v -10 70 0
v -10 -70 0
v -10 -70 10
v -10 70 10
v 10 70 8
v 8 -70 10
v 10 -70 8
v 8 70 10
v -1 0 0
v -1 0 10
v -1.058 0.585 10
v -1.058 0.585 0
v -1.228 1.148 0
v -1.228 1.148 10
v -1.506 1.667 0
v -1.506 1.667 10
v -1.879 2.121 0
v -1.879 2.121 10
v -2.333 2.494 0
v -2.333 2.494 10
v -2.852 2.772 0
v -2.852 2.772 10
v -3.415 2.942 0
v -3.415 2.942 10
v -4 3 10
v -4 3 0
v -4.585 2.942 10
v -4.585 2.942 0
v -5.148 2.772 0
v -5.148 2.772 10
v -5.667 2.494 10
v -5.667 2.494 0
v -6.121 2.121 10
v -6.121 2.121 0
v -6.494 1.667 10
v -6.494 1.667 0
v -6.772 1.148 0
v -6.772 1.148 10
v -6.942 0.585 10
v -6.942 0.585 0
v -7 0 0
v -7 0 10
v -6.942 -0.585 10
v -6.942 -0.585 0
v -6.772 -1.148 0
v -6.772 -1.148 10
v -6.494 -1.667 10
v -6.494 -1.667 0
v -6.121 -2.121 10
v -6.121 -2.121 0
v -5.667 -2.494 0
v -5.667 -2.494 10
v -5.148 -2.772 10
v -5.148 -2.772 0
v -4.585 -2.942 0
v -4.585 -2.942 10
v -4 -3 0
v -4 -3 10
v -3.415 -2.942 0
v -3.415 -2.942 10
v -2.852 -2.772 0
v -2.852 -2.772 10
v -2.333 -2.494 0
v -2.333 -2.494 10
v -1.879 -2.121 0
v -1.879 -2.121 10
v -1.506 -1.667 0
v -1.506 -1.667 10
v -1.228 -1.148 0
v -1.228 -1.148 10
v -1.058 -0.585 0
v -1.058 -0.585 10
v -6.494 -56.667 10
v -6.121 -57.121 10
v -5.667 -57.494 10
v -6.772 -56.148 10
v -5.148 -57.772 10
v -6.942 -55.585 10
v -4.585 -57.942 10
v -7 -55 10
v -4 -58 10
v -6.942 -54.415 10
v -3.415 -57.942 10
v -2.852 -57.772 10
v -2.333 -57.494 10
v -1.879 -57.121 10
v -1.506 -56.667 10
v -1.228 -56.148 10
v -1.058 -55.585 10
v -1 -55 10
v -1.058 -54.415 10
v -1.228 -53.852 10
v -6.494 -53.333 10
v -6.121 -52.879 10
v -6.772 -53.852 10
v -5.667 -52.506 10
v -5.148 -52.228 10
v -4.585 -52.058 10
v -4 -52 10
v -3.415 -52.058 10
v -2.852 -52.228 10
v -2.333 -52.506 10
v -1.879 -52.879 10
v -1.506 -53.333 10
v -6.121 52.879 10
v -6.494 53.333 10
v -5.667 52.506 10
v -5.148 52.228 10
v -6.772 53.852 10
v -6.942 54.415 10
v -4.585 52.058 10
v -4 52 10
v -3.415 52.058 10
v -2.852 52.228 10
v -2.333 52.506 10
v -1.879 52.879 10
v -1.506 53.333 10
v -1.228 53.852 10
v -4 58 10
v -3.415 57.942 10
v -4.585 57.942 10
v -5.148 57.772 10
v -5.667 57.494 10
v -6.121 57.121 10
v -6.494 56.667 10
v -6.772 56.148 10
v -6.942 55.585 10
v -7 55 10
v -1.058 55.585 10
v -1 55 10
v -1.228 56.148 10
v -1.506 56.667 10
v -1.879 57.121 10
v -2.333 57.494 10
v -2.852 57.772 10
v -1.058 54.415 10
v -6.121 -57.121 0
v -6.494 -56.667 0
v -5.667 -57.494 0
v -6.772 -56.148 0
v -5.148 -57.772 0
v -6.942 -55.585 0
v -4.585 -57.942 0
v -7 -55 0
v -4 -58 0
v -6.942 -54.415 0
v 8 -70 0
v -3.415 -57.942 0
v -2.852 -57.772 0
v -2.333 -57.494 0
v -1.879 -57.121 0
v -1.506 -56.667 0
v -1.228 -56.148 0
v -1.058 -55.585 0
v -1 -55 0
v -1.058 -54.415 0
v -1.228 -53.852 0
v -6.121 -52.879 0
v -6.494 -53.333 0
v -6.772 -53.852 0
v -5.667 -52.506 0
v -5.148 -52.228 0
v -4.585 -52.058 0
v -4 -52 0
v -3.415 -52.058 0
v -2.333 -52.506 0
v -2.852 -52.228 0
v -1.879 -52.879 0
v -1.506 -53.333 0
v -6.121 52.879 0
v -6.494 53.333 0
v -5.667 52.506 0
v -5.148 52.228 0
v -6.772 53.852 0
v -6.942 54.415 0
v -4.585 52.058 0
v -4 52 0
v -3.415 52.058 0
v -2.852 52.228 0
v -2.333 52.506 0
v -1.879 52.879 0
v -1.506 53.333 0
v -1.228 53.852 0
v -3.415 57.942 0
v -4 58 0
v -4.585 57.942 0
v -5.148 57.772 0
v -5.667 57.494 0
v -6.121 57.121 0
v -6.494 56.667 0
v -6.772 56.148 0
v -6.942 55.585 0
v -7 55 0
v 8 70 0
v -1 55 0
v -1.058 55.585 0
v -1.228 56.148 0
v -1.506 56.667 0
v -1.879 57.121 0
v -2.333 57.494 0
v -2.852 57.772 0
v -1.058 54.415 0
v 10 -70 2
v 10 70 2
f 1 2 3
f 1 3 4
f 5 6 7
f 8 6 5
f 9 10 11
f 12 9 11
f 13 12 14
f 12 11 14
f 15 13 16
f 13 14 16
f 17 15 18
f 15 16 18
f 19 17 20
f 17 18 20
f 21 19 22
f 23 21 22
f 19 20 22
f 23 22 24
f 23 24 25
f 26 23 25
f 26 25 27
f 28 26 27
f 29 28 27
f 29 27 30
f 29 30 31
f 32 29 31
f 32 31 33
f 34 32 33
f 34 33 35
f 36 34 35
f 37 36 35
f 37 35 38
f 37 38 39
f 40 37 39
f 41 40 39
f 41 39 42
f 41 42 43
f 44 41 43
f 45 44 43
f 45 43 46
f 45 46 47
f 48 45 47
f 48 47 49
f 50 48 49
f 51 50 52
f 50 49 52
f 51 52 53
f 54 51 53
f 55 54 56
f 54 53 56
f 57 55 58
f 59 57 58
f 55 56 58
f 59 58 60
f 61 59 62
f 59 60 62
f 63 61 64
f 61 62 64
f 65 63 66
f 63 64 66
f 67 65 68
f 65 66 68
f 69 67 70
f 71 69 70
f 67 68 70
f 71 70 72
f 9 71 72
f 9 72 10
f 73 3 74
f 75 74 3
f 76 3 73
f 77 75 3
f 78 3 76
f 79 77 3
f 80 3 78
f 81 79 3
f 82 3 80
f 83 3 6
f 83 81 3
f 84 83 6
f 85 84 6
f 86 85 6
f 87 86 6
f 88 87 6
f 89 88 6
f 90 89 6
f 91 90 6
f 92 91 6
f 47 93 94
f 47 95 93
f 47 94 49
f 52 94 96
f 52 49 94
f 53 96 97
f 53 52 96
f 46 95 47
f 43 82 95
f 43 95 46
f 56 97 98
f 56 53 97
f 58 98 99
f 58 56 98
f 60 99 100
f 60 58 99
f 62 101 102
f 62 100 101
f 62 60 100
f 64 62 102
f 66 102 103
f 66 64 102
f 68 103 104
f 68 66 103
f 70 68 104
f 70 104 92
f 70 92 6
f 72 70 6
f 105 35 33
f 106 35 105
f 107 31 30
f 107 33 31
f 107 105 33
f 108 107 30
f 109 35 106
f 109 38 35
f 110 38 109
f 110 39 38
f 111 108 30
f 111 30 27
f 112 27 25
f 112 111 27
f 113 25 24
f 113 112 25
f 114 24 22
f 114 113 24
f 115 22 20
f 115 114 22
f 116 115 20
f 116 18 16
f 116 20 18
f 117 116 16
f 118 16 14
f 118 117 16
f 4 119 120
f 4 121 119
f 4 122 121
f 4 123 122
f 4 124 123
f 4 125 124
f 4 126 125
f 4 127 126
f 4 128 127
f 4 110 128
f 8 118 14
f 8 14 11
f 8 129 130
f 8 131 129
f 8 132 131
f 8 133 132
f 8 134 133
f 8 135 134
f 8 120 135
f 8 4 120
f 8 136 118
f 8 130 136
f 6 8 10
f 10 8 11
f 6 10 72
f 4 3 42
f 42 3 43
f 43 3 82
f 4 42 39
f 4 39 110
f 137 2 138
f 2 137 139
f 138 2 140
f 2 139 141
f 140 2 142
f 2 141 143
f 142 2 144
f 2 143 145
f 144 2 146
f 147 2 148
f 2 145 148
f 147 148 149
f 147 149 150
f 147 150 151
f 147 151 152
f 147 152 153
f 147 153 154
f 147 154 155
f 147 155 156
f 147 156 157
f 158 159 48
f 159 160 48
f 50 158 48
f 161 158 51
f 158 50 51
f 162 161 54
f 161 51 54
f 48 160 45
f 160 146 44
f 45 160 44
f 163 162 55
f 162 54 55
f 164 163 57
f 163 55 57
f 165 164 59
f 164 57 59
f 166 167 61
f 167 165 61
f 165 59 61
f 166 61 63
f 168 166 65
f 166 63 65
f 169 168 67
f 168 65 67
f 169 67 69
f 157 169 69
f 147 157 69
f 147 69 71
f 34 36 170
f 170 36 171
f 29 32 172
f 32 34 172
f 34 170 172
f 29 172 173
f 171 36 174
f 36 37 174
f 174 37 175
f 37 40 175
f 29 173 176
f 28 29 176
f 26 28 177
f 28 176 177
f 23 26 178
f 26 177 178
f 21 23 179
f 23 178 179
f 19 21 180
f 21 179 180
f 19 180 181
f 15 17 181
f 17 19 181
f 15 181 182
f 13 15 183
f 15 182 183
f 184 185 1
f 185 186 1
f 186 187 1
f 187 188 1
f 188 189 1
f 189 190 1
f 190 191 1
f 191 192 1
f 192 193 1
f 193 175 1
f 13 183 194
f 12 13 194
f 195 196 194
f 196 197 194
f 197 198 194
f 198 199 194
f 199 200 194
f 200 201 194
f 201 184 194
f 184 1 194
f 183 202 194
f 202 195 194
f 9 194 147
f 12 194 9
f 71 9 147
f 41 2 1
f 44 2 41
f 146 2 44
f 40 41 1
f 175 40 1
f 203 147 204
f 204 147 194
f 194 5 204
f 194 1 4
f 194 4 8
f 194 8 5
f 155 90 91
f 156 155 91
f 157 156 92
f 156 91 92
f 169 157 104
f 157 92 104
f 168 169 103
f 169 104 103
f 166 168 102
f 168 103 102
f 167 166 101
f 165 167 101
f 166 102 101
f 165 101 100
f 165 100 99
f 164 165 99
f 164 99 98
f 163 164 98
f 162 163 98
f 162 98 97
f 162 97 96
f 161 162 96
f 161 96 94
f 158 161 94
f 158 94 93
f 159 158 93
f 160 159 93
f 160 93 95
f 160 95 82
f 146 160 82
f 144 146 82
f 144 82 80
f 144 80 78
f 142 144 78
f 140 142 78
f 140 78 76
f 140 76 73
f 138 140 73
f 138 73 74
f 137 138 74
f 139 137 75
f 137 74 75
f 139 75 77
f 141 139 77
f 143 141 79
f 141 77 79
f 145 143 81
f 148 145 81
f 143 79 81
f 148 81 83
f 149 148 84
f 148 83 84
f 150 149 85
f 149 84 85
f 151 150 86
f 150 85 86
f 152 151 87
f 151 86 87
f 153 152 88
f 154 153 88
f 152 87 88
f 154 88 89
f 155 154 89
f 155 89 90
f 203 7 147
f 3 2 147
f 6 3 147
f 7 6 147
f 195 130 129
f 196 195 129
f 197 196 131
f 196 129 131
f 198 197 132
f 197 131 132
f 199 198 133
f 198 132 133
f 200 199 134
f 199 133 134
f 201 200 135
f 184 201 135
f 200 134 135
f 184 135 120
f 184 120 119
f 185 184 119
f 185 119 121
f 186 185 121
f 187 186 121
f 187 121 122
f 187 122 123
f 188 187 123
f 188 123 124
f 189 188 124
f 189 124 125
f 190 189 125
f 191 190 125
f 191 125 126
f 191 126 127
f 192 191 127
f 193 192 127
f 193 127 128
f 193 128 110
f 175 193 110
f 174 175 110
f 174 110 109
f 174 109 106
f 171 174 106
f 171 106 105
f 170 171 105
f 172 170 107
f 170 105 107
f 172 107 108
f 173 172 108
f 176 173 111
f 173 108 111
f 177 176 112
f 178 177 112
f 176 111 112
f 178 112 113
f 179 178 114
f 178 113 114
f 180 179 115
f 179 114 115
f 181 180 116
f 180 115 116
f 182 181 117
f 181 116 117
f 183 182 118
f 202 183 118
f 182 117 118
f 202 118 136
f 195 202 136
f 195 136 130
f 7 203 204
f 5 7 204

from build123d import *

# Parameters (mm, degrees)
SKETCH1_W           = 20
SKETCH1_H           = 140
BOSS_EXTRUDE1_DEPTH = 10
CHAMFER1_SIZE       = 2
SKETCH2_R           = 3
CUT_EXTRUDE1_DEPTH  = 11


with BuildPart() as part:
    # Sketch1 → Boss-Extrude1 (new body)
    with BuildSketch(Plane.XY):
        Rectangle(SKETCH1_W, SKETCH1_H)
    extrude(amount=BOSS_EXTRUDE1_DEPTH)

    # Chamfer1
    chamfer1_edges = [part.edges().sort_by_distance(p)[0] for p in [
        (10, 0, 0),
        (10, 0, 10),
    ]]
    chamfer(chamfer1_edges, length=CHAMFER1_SIZE)

    # Sketch2 → Cut-Extrude1 (cut, through all)
    with BuildSketch(Plane.XY.offset(10)):
        with Locations((-4, 55)):
            Circle(SKETCH2_R)
        with Locations((-4, 0)):
            Circle(SKETCH2_R)
        with Locations((-4, -55)):
            Circle(SKETCH2_R)
    extrude(amount=-CUT_EXTRUDE1_DEPTH, mode=Mode.SUBTRACT)


solid = part.part
